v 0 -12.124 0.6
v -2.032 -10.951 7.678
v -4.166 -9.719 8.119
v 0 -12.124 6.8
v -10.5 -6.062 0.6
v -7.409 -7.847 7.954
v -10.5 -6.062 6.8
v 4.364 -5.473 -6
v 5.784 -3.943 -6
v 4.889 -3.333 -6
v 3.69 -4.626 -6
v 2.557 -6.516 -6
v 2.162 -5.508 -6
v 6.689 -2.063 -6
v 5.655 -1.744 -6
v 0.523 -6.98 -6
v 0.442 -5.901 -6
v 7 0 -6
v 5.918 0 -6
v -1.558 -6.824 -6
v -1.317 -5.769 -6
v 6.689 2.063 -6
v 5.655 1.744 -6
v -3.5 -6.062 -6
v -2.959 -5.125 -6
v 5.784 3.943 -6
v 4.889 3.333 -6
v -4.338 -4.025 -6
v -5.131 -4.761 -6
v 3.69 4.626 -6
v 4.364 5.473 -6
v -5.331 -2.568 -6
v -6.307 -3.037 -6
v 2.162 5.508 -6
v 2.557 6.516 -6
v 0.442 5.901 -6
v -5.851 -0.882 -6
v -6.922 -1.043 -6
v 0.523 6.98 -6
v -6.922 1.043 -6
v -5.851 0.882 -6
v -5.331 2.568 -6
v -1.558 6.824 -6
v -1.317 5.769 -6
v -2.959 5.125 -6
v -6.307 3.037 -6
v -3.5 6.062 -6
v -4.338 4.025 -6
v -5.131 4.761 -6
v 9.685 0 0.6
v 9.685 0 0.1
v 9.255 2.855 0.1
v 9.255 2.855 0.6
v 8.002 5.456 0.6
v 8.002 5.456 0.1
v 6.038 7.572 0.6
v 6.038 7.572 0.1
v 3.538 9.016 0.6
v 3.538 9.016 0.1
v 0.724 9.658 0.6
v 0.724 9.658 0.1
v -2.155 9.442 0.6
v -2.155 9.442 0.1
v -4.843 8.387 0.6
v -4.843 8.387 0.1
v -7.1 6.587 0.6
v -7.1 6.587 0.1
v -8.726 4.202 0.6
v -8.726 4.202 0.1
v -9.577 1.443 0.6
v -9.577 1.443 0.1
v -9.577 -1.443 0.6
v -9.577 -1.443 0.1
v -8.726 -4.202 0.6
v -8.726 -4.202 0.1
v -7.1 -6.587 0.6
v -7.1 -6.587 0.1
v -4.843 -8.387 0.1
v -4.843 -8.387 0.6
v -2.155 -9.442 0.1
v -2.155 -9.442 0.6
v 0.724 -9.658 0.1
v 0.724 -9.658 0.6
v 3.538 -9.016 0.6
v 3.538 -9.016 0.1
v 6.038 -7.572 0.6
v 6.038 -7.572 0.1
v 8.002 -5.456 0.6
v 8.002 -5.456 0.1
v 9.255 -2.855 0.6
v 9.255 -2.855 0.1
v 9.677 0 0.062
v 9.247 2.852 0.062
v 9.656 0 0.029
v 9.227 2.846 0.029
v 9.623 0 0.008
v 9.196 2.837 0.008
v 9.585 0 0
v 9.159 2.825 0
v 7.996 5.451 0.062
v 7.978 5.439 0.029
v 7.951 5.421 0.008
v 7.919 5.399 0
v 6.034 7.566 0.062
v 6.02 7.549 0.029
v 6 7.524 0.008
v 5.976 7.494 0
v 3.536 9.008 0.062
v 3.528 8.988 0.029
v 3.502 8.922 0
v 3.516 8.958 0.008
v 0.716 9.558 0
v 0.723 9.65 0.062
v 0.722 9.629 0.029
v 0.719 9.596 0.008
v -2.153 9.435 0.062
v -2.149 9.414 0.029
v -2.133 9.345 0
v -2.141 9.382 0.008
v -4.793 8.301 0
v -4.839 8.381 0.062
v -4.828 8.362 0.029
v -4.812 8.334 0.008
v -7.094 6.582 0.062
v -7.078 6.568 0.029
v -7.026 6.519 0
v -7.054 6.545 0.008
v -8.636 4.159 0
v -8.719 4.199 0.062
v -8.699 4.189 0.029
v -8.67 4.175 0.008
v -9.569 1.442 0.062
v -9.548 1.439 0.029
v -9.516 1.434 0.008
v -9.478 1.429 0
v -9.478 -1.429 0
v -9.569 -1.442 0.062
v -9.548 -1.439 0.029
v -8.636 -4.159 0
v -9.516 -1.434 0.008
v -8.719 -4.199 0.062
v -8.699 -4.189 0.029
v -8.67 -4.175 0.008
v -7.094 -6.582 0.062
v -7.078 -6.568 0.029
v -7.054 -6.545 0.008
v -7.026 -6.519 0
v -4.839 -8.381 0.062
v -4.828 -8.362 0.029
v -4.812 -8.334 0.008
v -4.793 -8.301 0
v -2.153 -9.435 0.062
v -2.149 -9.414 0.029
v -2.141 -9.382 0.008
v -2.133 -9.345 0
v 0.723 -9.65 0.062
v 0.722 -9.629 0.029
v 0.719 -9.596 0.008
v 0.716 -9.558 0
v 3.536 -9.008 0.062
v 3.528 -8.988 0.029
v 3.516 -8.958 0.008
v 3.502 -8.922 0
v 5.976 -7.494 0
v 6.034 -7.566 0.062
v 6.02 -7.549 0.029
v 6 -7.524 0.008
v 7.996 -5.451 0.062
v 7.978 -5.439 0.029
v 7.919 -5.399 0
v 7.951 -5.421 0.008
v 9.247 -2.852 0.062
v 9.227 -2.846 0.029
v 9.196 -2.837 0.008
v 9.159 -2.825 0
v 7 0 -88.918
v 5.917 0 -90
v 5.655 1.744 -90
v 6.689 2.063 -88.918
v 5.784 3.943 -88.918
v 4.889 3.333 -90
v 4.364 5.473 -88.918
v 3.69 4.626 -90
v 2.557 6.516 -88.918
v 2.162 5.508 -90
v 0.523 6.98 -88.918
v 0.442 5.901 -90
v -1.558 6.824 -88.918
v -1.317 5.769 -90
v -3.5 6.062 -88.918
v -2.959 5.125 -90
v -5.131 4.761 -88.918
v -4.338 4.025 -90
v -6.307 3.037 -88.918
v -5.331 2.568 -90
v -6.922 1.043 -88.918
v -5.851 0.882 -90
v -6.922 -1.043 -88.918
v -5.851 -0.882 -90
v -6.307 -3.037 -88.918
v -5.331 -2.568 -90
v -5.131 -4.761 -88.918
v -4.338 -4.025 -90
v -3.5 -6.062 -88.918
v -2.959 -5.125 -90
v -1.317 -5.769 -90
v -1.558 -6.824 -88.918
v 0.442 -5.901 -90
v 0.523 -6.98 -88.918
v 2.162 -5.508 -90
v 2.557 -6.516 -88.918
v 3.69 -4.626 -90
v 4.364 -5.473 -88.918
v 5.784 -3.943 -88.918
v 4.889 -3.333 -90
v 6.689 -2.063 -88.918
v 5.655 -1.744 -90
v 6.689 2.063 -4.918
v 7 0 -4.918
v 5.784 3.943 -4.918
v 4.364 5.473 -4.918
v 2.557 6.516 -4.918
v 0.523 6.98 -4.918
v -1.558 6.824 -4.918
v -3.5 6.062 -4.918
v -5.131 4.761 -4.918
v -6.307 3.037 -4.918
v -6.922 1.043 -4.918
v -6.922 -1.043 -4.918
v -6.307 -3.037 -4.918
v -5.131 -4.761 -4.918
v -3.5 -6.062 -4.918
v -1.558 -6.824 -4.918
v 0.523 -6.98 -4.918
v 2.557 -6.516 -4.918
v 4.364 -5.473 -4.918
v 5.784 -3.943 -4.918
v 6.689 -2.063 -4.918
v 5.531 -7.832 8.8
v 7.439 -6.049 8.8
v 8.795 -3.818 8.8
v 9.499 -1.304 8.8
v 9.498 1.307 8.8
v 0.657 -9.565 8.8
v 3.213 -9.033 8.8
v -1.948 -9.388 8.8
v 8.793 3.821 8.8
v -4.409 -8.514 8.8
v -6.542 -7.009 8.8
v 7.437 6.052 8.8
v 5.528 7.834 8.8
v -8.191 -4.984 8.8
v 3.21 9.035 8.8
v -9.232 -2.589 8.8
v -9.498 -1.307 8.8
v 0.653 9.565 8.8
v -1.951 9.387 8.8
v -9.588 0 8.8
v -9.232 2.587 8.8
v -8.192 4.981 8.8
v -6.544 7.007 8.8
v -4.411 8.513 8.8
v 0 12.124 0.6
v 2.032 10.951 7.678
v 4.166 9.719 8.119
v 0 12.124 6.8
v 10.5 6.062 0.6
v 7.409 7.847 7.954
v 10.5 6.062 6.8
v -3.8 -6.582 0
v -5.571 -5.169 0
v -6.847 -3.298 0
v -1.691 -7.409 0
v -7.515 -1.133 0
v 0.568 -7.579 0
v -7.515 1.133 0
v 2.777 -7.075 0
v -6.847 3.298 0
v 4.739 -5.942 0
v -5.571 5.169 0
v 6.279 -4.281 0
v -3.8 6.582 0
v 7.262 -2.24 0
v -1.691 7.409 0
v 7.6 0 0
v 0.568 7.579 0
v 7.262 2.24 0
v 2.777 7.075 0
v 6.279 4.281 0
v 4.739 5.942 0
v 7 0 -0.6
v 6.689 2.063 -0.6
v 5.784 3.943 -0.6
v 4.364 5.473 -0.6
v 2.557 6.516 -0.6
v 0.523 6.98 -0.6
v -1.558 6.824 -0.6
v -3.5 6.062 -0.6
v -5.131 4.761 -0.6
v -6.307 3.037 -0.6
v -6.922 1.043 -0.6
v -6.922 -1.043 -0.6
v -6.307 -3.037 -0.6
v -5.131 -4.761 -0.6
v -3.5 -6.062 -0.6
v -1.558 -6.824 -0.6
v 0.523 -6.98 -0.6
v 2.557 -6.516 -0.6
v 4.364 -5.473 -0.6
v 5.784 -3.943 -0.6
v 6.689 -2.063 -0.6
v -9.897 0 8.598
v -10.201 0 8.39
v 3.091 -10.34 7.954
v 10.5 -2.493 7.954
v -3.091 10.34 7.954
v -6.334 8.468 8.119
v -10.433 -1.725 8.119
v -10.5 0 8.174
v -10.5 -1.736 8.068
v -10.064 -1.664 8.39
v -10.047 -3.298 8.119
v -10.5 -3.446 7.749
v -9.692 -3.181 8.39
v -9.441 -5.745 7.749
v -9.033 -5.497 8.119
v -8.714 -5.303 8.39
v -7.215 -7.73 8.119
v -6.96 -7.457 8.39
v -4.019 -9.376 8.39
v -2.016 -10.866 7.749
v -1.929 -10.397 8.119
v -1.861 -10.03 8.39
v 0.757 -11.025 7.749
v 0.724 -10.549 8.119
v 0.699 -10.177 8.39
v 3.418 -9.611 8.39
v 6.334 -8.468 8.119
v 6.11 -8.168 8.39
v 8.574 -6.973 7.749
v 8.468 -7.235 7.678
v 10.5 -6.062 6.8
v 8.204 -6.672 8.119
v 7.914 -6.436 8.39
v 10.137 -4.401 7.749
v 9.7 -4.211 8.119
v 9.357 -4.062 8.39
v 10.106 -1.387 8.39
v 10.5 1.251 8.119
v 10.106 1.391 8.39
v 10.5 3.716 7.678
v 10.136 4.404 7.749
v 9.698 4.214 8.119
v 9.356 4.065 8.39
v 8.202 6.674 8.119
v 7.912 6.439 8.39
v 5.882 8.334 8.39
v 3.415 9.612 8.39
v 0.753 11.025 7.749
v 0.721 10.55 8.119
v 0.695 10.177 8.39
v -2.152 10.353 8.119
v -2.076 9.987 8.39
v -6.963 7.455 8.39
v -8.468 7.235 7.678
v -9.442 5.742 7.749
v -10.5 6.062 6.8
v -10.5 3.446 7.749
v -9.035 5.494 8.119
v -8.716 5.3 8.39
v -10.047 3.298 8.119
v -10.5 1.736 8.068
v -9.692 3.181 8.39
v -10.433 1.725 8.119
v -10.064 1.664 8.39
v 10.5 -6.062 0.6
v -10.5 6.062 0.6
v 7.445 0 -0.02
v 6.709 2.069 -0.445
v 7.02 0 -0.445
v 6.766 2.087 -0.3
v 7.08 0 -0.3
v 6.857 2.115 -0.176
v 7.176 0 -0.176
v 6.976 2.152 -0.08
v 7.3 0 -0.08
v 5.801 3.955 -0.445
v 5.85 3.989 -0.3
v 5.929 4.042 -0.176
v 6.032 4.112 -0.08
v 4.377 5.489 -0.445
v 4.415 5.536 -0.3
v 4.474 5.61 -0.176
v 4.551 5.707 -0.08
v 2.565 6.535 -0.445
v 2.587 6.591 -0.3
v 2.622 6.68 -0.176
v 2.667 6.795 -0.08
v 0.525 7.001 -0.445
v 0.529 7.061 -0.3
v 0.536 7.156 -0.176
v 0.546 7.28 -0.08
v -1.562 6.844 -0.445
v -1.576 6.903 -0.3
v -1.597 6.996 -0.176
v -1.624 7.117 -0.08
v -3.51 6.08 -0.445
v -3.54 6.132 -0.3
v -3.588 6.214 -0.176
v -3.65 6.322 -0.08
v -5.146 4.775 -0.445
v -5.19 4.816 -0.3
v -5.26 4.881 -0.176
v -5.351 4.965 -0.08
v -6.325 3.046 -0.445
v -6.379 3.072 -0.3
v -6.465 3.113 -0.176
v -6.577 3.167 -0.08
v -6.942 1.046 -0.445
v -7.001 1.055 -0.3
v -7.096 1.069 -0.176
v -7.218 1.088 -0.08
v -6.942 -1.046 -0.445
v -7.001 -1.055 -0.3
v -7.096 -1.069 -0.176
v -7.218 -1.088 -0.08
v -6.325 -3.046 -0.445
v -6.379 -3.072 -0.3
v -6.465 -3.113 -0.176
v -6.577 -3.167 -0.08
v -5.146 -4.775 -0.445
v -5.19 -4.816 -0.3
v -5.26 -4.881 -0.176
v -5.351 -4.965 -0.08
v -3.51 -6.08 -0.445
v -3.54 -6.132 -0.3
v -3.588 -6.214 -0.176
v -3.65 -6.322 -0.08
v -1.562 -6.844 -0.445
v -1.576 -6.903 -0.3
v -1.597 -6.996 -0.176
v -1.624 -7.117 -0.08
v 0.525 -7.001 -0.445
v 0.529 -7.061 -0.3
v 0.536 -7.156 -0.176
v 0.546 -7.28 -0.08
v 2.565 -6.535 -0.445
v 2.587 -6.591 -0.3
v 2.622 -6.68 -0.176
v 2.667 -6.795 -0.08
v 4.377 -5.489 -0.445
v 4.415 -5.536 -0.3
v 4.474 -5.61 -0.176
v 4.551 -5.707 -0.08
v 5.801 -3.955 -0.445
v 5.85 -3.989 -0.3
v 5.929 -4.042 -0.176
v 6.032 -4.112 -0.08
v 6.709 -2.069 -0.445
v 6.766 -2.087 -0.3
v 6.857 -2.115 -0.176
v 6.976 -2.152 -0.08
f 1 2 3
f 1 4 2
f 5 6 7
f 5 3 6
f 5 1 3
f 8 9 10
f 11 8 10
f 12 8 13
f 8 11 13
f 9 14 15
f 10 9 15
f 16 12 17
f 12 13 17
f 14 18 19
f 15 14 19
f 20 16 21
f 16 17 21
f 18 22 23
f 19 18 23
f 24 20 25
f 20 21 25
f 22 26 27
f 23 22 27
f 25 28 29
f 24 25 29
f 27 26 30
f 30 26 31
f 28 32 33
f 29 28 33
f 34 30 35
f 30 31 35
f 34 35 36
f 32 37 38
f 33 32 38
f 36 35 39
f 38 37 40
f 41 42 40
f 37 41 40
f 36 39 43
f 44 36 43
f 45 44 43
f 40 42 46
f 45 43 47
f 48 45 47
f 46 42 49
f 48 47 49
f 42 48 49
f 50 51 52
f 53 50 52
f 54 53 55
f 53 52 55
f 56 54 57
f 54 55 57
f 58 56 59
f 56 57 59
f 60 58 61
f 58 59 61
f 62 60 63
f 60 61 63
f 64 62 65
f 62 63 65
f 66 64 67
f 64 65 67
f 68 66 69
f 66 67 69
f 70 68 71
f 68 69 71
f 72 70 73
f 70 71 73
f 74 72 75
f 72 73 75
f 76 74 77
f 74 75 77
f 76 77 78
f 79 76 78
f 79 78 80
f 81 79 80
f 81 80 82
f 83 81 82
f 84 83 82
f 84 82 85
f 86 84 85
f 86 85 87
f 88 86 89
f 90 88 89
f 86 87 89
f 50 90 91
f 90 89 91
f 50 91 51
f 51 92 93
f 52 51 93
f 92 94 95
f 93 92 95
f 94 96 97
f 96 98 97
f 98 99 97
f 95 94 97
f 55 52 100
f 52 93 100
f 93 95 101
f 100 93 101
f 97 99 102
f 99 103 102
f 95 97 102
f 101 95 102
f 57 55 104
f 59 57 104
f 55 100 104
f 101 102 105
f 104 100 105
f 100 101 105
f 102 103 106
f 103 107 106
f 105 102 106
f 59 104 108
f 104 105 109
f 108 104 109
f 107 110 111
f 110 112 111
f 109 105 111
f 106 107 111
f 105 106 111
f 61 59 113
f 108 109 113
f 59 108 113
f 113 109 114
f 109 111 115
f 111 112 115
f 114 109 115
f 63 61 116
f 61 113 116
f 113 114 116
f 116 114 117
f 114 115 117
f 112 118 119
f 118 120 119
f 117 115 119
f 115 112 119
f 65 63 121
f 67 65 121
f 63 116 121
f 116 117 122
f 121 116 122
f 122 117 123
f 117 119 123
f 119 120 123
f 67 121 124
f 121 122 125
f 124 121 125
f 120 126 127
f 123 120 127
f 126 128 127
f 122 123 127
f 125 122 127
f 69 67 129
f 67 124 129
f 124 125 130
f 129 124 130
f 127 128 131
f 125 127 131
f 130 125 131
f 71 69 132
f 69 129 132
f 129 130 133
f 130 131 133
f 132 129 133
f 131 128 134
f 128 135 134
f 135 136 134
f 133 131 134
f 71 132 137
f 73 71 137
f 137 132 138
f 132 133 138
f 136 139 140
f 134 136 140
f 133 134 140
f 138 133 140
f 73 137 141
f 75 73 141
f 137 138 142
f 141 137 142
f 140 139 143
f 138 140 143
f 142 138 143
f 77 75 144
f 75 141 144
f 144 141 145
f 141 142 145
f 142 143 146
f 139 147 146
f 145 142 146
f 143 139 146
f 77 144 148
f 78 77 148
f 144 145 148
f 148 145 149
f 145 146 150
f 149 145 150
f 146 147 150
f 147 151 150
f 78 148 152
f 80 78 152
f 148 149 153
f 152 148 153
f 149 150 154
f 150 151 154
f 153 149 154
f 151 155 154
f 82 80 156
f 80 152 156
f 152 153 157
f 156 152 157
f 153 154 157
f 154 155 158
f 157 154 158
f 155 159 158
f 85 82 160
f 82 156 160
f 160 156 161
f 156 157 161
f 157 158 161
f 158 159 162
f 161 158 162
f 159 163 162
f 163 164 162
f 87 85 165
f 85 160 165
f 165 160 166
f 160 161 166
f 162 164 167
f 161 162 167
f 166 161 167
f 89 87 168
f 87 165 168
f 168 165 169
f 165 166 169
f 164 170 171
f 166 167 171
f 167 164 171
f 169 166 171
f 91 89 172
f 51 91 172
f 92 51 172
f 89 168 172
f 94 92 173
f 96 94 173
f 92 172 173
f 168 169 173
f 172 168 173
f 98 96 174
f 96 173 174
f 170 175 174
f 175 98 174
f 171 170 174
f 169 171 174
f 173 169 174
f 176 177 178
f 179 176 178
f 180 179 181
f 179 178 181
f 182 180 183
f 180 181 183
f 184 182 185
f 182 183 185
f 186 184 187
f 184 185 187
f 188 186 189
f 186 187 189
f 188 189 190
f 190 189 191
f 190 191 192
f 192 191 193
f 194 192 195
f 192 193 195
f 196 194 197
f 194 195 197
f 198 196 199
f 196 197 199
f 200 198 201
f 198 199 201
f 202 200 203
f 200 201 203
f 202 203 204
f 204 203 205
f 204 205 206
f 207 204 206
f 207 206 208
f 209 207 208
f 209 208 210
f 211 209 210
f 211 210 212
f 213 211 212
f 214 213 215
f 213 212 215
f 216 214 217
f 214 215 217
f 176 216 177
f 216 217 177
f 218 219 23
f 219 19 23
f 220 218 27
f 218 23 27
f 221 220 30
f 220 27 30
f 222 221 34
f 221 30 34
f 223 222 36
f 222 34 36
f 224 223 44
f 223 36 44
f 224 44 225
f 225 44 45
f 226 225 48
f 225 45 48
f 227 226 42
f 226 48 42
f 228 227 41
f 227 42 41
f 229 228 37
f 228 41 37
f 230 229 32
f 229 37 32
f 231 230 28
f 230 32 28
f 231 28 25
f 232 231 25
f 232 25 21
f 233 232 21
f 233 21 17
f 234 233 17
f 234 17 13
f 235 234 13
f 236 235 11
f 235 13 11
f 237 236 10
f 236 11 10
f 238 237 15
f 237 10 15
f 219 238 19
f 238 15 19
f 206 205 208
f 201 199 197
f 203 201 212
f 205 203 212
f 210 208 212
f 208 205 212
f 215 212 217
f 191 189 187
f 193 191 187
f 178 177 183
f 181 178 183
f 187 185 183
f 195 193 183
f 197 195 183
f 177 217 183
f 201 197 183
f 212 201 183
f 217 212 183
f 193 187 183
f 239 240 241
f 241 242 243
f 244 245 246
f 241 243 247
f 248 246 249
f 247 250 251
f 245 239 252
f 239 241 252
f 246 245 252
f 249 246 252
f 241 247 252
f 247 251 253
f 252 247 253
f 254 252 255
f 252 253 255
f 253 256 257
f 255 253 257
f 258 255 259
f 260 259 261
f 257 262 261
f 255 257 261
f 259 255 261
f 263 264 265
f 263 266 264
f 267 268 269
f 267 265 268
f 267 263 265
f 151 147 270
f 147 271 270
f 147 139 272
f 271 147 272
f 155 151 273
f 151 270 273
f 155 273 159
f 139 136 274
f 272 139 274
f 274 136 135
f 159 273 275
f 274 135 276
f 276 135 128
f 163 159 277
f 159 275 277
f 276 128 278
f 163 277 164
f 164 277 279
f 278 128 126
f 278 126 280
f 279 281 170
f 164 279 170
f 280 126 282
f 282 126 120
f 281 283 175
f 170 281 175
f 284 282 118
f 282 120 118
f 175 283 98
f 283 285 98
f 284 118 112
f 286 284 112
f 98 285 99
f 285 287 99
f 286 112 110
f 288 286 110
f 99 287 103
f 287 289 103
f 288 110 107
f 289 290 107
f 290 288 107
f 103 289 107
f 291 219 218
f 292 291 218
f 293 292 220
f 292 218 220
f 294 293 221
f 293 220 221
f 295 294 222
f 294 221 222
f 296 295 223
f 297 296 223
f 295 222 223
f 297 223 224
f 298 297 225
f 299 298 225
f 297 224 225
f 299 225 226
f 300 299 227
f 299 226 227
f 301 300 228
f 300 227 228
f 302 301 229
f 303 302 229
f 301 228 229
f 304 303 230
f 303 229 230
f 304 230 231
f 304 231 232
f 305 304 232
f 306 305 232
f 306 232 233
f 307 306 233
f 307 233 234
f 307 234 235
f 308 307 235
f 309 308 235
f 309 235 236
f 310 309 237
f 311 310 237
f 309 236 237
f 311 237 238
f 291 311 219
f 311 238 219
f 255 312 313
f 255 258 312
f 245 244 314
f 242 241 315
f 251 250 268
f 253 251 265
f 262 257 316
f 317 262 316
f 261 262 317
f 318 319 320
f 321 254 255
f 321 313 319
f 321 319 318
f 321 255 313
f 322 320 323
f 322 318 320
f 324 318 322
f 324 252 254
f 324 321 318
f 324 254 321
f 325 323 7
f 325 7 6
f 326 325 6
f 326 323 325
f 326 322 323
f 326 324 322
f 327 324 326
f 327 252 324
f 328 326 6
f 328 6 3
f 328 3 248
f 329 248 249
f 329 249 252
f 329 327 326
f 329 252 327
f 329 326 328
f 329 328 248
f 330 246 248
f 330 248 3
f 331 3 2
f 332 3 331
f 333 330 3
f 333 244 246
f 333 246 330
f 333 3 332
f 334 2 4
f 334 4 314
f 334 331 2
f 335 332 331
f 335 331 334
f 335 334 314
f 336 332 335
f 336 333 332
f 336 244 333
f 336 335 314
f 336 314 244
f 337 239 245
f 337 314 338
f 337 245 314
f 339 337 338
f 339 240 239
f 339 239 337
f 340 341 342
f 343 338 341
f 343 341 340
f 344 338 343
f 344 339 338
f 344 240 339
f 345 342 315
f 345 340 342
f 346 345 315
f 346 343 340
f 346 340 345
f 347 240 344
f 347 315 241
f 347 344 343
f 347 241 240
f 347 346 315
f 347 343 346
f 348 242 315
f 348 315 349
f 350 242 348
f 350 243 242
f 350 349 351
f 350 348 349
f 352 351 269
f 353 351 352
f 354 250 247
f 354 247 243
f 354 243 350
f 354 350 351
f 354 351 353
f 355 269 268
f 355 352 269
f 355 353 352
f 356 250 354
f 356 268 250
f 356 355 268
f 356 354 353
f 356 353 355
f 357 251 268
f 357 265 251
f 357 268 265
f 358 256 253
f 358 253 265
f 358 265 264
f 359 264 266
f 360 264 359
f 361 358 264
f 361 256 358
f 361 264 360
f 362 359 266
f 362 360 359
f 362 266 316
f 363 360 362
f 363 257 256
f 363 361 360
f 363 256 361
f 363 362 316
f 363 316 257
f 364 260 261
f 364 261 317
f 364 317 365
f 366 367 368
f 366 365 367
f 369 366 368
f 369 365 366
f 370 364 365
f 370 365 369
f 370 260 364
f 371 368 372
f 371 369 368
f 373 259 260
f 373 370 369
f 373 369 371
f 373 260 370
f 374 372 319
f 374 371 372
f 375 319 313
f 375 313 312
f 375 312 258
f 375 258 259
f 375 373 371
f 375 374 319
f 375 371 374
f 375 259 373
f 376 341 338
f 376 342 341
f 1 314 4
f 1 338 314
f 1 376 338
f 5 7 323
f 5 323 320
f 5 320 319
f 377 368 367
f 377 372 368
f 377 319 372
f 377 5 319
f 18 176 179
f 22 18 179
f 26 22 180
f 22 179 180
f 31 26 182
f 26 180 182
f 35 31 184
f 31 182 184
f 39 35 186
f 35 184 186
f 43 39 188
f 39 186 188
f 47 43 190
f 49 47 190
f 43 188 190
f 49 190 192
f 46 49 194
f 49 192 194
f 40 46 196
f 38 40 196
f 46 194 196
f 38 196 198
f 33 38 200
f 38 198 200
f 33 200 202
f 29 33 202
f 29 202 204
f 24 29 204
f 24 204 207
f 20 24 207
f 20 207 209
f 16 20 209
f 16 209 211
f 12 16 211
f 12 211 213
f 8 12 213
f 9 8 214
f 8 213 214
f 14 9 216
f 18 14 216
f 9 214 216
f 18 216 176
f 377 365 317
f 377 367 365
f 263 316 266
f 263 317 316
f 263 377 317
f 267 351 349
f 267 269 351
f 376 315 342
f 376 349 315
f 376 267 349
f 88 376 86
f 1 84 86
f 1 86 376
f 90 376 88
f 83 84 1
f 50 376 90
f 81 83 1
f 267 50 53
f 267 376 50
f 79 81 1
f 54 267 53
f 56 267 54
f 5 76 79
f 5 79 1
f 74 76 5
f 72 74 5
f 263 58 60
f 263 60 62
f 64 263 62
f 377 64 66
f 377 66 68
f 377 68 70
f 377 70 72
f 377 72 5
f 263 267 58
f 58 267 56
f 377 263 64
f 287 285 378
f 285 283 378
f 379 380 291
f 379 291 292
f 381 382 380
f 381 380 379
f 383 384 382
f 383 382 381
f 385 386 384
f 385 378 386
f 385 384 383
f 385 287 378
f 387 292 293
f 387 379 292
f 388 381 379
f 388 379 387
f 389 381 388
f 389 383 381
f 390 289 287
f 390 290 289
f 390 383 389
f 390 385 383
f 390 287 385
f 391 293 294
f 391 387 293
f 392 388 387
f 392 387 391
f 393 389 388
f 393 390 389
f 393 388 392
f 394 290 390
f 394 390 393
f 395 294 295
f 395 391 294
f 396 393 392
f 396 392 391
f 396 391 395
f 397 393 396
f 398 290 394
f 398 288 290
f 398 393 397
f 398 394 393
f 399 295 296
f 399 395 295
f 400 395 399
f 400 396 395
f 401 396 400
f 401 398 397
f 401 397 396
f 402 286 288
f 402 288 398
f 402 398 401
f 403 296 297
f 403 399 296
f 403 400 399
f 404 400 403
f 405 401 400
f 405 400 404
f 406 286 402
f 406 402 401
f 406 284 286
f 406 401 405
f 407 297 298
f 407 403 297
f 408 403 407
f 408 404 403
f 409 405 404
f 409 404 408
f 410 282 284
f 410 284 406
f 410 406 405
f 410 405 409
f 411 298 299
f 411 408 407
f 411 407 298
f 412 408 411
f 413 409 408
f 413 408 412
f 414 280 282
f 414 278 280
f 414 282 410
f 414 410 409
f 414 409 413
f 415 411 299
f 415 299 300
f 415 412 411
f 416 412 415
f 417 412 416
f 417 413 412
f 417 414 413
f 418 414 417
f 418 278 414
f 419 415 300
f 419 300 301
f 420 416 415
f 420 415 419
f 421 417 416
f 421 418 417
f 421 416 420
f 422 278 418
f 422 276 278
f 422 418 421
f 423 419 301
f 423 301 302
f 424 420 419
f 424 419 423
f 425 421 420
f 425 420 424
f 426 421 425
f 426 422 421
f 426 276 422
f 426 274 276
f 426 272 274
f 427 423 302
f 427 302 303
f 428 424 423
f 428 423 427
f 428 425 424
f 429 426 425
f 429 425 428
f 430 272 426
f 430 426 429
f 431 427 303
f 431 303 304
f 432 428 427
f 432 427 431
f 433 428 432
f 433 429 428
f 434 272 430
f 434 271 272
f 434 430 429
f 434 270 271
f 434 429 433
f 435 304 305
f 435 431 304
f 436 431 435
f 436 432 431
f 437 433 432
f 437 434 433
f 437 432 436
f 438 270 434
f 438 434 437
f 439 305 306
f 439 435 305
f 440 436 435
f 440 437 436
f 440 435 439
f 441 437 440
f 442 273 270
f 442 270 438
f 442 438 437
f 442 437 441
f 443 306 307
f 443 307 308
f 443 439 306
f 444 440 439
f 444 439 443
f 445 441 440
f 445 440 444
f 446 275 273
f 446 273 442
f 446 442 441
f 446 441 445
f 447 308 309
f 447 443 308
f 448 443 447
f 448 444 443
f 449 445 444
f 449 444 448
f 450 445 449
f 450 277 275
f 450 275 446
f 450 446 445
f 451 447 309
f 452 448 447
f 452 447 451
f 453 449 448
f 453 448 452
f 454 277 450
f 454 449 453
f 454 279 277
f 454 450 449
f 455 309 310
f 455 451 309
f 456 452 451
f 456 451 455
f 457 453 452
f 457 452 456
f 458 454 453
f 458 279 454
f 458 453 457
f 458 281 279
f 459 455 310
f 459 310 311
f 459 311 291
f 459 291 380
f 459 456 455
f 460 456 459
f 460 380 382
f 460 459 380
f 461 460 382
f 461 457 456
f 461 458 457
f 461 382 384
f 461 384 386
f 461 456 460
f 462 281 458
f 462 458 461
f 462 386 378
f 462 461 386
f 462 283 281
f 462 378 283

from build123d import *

# Parameters (mm, degrees)
DODANIE_WYCI_GNI_CIE1_DEPTH = 8.2
ZAOKR_GLENIE1_R             = 0.1
SFAZOWANIE1_SIZE            = 1.0825
ZAOKR_GLENIE3_R             = 0.6


with BuildPart() as part:
    # Szkic1 → Dodanie-wyciągnięcie1 (new body)
    with BuildSketch(Plane(origin=(0, 0, 0.6), x_dir=(-1, 0, 0), z_dir=(0, 0, -1))):
        Polygon((4.896e-06, 12.124341521), (-10.499990209, 6.062166521), (-10.499990209, -6.062183479), (-9.791e-06, -12.12435), (10.499990209, -6.062183479), (10.499990209, 6.062166521), align=None)
    extrude(amount=-DODANIE_WYCI_GNI_CIE1_DEPTH)

    # Szkic2 → Obrót1 (revolve)
    with BuildSketch(Plane(origin=(0, 0, 0), x_dir=(1, 0, 0), z_dir=(0, 1, 0))):
        Polygon((7, 90), (0, 90), (0, -0.6), (9.685, -0.6), (9.685, 0), (7, 0), (7, 4.9175), (5.9175, 6), (7, 6), align=None)
    revolve(axis=Axis((0, 0, -90), (0, 0, 1)))

    # Zaokrąglenie1
    zaokr_glenie1_edges = [part.edges().sort_by_distance(p)[0] for p in [
        (-9.685, 0, 0),
    ]]
    fillet(zaokr_glenie1_edges, radius=ZAOKR_GLENIE1_R)

    # Sfazowanie1
    sfazowanie1_edges = [part.edges().sort_by_distance(p)[0] for p in [
        (-7, 0, -90),
    ]]
    chamfer(sfazowanie1_edges, length=SFAZOWANIE1_SIZE)

    # Zaokrąglenie3
    zaokr_glenie3_edges = [part.edges().sort_by_distance(p)[0] for p in [
        (-7, 0, 0),
    ]]
    fillet(zaokr_glenie3_edges, radius=ZAOKR_GLENIE3_R)

    # Szkic3 → Wycięcie-obrót1 (revolve, cut)
    with BuildSketch(Plane(origin=(0, 0, 0), x_dir=(1, 0, 0), z_dir=(0, 1, 0))):
        with BuildLine():
            ThreePointArc((-17, 4.7), (-12.313708499, -6.613708499), (-1, -11.3))
            Line((-1, -11.3), (-17, -11.3))
            Line((-17, -11.3), (-17, 4.7))
        make_face()
        with BuildLine():
            ThreePointArc((-1, -11.3), (-12.313708499, -6.613708499), (-17, 4.7))
            Line((-17, 4.7), (-17, -11.3))
            Line((-17, -11.3), (-1, -11.3))
        make_face()
    revolve(axis=Axis((0, 0, -88.9175), (0, 0, 1)), mode=Mode.SUBTRACT)


solid = part.part
